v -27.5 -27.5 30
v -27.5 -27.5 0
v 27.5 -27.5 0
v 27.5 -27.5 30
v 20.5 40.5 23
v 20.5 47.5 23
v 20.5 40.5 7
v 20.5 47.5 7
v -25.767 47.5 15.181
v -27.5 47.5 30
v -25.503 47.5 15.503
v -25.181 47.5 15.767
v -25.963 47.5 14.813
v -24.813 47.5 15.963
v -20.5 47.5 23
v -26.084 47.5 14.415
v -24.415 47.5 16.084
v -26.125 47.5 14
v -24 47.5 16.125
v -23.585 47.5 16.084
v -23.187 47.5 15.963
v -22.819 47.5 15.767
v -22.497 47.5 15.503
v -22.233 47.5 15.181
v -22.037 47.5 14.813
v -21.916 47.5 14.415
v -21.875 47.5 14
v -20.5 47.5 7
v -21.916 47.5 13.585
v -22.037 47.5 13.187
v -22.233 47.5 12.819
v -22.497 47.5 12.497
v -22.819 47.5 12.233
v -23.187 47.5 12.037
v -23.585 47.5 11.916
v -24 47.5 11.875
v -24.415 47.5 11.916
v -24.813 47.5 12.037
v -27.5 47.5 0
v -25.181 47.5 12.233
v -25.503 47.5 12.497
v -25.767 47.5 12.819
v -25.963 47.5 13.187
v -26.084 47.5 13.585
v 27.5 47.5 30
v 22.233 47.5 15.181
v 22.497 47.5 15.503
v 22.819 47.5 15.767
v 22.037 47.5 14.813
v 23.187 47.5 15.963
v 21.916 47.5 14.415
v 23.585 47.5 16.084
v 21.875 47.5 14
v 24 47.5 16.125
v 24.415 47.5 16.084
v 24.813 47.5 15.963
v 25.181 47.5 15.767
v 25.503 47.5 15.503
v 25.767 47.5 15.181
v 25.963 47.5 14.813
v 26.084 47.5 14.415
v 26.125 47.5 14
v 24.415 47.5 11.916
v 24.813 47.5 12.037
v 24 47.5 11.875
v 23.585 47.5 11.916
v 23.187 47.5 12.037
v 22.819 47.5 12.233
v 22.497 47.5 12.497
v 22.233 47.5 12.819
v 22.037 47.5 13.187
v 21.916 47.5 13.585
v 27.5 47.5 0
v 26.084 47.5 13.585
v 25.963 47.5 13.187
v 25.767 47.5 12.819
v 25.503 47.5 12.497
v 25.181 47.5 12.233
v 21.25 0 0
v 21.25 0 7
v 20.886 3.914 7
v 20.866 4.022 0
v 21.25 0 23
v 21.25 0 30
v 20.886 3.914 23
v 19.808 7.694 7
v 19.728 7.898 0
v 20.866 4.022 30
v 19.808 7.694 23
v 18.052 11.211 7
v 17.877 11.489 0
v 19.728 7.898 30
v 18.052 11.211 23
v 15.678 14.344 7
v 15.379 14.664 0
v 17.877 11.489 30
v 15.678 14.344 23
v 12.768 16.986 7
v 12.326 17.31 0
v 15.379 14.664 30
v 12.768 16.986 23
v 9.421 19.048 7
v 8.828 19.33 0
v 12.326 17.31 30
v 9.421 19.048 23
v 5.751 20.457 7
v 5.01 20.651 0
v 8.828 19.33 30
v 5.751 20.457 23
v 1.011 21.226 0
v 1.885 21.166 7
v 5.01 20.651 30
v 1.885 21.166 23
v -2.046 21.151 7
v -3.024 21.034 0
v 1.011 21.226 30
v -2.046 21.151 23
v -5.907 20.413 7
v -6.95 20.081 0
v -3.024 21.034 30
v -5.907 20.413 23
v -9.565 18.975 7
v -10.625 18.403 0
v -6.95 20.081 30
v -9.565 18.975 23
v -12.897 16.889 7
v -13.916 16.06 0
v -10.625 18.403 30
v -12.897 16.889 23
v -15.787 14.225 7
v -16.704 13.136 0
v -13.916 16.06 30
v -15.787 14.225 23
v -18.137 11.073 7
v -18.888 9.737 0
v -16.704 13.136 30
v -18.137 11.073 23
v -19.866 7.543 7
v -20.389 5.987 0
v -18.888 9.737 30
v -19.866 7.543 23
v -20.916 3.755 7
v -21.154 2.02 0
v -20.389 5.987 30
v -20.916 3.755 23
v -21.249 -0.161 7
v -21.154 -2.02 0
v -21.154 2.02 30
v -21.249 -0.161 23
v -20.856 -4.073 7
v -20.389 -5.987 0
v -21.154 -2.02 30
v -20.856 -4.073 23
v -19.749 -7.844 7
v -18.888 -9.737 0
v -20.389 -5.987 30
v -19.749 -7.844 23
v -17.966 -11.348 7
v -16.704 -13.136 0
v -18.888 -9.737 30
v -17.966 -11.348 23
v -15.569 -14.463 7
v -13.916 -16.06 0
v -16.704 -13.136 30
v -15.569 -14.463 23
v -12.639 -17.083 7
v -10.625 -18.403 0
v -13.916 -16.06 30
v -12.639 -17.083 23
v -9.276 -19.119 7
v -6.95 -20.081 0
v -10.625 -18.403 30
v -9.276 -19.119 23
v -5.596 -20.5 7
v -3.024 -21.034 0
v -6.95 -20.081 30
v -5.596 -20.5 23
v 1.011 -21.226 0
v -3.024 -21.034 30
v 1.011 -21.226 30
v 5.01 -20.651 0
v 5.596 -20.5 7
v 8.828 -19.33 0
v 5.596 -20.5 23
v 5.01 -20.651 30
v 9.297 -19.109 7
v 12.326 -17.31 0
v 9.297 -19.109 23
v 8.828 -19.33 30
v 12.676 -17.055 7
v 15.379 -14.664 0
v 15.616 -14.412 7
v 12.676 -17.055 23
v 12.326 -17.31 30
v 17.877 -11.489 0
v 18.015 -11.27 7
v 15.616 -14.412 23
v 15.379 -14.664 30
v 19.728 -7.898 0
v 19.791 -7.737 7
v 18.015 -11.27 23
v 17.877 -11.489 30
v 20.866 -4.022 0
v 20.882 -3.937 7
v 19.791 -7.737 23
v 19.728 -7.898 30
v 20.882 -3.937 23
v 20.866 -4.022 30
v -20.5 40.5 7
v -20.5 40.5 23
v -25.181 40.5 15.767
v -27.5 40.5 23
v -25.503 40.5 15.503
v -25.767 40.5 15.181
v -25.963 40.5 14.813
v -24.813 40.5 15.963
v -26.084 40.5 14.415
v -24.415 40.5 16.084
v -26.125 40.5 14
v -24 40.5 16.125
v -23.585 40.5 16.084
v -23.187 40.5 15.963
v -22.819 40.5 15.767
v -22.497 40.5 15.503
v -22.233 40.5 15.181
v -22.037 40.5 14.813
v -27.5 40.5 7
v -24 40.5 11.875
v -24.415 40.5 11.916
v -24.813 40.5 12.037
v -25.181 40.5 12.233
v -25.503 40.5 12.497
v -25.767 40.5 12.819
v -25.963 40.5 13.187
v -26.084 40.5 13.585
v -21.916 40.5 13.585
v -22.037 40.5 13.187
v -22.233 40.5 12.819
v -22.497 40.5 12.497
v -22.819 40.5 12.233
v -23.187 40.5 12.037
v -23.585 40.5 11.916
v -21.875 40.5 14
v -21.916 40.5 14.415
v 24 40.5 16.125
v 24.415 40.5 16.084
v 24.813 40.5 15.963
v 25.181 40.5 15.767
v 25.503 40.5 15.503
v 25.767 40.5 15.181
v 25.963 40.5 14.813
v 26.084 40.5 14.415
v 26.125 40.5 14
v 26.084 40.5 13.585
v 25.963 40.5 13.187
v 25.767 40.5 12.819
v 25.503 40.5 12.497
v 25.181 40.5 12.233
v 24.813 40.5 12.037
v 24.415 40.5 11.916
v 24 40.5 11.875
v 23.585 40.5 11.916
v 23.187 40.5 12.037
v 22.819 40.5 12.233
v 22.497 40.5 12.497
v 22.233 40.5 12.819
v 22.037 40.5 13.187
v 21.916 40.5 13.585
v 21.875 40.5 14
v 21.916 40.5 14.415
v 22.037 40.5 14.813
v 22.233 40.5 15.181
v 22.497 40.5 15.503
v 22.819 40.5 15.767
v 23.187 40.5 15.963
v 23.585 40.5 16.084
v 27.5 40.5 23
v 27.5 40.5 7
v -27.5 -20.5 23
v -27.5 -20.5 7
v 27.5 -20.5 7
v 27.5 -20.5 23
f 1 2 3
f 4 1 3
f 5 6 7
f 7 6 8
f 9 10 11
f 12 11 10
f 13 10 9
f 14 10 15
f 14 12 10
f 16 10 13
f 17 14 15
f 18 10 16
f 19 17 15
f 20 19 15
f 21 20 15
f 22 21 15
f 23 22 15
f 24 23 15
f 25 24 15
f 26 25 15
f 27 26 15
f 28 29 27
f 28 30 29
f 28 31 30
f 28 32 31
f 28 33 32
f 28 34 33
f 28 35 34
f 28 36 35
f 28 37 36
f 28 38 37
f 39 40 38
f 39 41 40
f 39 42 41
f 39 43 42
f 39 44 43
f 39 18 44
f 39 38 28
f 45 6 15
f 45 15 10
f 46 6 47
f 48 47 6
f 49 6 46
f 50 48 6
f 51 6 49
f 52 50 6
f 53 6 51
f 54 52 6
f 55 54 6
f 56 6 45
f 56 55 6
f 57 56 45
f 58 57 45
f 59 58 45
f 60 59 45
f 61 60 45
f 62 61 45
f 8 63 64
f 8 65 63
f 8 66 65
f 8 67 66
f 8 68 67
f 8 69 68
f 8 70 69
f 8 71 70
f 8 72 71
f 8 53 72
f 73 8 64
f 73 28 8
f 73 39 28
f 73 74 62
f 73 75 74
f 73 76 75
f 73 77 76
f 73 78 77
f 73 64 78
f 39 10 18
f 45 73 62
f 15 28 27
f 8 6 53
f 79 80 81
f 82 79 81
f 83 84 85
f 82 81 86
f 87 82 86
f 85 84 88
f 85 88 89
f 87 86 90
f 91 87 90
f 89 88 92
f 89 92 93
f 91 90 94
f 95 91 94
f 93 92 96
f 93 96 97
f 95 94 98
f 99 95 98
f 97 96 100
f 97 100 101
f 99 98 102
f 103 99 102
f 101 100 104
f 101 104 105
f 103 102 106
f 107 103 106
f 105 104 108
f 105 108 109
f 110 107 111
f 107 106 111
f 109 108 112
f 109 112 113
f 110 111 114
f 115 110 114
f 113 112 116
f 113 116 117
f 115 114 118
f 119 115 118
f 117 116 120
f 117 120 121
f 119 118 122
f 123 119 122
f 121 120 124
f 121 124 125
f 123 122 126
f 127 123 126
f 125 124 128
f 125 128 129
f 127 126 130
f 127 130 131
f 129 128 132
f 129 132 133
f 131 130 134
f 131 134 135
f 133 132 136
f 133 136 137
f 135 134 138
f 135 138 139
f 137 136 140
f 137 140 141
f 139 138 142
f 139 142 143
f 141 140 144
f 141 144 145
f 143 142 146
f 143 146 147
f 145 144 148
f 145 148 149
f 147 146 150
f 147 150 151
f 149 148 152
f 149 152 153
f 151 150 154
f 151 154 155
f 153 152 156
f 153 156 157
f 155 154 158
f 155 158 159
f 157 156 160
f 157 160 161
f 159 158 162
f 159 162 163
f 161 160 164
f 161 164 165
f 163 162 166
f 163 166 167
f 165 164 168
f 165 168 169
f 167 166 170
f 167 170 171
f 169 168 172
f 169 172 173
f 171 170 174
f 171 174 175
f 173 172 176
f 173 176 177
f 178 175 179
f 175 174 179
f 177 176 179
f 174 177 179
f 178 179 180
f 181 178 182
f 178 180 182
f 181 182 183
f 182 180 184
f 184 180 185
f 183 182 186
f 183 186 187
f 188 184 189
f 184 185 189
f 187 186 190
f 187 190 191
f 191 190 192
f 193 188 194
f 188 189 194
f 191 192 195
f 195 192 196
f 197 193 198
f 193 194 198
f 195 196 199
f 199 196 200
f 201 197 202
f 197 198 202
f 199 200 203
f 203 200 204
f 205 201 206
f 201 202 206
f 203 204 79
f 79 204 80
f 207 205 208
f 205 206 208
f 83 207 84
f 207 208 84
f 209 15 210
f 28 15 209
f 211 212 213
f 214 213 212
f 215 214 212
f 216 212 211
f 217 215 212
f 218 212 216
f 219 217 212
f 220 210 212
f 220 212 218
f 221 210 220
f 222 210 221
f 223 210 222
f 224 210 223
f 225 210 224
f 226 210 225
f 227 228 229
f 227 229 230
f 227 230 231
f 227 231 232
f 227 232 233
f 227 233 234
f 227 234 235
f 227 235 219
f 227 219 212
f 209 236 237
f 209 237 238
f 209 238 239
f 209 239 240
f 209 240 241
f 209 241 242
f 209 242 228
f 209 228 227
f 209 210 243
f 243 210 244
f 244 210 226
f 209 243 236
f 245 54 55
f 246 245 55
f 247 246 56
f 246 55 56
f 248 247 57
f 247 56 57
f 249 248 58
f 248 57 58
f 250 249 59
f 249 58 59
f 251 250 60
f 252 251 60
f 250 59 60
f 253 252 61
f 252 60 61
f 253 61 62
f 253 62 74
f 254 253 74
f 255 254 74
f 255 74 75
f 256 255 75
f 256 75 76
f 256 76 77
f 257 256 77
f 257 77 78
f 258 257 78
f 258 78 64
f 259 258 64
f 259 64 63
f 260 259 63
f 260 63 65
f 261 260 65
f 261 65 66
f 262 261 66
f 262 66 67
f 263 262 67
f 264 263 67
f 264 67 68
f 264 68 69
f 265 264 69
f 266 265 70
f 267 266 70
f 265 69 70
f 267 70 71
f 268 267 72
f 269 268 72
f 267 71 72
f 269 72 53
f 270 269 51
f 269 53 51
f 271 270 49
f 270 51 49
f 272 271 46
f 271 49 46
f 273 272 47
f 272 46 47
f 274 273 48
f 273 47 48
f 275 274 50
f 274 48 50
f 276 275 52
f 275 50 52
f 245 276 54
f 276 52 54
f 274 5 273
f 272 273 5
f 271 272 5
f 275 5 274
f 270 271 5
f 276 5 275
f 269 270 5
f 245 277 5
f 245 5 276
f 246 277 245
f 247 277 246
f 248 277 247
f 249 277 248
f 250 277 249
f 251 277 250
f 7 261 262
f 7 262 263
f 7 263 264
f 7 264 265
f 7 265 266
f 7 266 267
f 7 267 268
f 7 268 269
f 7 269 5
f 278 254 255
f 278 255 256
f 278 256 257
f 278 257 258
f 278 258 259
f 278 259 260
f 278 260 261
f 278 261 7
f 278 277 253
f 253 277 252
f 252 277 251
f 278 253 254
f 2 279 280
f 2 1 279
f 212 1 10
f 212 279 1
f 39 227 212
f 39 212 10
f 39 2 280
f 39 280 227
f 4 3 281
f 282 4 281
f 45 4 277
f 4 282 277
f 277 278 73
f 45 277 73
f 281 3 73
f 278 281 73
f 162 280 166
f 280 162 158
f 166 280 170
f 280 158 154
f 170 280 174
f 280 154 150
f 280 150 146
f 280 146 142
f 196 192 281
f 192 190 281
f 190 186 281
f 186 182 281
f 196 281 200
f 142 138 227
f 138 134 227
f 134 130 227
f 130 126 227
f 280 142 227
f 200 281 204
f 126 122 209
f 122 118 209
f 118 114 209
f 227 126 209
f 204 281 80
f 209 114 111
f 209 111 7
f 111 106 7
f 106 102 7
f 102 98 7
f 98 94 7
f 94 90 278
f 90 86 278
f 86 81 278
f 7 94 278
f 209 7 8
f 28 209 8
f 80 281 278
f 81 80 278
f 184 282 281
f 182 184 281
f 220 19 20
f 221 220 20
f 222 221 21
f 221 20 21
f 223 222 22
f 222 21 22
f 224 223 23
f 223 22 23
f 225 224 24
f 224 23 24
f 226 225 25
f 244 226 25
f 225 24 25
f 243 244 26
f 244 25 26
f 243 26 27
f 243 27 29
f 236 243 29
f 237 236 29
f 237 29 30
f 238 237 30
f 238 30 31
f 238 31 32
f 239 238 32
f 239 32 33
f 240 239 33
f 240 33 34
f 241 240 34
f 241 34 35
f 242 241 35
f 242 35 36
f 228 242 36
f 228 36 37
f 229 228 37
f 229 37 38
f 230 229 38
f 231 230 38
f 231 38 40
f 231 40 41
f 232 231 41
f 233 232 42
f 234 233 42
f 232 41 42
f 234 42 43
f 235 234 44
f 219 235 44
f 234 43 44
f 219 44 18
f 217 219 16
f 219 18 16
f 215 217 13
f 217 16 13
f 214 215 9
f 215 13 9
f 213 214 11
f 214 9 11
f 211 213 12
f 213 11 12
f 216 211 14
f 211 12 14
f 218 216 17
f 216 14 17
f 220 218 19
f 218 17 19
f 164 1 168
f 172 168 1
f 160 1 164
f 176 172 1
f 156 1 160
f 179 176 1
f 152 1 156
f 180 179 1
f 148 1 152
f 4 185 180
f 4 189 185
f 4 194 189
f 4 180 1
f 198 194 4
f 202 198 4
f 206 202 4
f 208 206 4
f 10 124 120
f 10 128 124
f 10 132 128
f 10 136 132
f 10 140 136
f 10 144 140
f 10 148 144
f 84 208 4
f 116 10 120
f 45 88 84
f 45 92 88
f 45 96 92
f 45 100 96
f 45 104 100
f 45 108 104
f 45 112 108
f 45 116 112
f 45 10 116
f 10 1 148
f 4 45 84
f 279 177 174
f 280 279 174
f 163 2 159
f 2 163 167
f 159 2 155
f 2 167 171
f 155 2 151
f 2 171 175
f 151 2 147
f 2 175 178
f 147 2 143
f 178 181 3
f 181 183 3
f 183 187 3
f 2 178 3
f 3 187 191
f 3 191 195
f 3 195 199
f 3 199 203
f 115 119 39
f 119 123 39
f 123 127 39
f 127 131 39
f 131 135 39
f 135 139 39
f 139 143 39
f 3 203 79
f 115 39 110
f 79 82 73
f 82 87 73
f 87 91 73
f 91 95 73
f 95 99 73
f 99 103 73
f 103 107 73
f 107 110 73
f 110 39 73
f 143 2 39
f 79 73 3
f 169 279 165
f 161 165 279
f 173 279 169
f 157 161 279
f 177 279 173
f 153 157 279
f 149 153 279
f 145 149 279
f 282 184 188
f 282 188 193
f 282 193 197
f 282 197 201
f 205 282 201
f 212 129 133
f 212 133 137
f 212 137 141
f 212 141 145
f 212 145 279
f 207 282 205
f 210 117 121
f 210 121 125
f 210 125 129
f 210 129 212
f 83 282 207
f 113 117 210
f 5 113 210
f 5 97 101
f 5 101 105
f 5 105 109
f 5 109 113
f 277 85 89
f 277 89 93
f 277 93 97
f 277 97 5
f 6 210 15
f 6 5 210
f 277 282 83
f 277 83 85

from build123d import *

# Parameters (mm, degrees)
SKETCH1_W           = 55
SKETCH1_H           = 75
BOSS_EXTRUDE1_DEPTH = 30
SKETCH2_R           = 21.25
CUT_EXTRUDE1_DEPTH  = 30
SKETCH3_W           = 41
SKETCH3_H           = 16
CUT_EXTRUDE2_DEPTH  = 60
SKETCH4_W           = 16
SKETCH4_H           = 61
CUT_EXTRUDE3_DEPTH  = 60
SKETCH5_R           = 2.125
CUT_EXTRUDE4_DEPTH  = 10


with BuildPart() as part:
    # Sketch1 → Boss-Extrude1 (new body)
    with BuildSketch(Plane.XY):
        with Locations((0, 10)):
            Rectangle(SKETCH1_W, SKETCH1_H)
    extrude(amount=BOSS_EXTRUDE1_DEPTH)

    # Sketch2 → Cut-Extrude1 (cut)
    with BuildSketch(Plane.XY.offset(30)):
        Circle(SKETCH2_R)
    extrude(amount=-CUT_EXTRUDE1_DEPTH, mode=Mode.SUBTRACT)

    # Sketch3 → Cut-Extrude2 (cut)
    with BuildSketch(Plane(origin=(0, 47.5, 0), x_dir=(1, 0, 0), z_dir=(0, 1, 0))):
        with Locations((0, -15)):
            Rectangle(SKETCH3_W, SKETCH3_H)
    extrude(amount=-CUT_EXTRUDE2_DEPTH, mode=Mode.SUBTRACT)

    # Sketch4 → Cut-Extrude3 (cut)
    with BuildSketch(Plane(origin=(27.5, 0, 0), x_dir=(0, 0, -1), z_dir=(1, 0, 0))):
        with Locations((-15, 10)):
            Rectangle(SKETCH4_W, SKETCH4_H)
    extrude(amount=-CUT_EXTRUDE3_DEPTH, mode=Mode.SUBTRACT)

    # Sketch5 → Cut-Extrude4 (cut)
    with BuildSketch(Plane(origin=(0, 47.5, 0), x_dir=(1, 0, 0), z_dir=(0, 1, 0))):
        with Locations(Location((-24, -14, 0), (0, 0, 270))):
            Circle(SKETCH5_R)
        with Locations(Location((24, -14, 0), (0, 0, 270))):
            Circle(SKETCH5_R)
    extrude(amount=-CUT_EXTRUDE4_DEPTH, mode=Mode.SUBTRACT)


solid = part.part
